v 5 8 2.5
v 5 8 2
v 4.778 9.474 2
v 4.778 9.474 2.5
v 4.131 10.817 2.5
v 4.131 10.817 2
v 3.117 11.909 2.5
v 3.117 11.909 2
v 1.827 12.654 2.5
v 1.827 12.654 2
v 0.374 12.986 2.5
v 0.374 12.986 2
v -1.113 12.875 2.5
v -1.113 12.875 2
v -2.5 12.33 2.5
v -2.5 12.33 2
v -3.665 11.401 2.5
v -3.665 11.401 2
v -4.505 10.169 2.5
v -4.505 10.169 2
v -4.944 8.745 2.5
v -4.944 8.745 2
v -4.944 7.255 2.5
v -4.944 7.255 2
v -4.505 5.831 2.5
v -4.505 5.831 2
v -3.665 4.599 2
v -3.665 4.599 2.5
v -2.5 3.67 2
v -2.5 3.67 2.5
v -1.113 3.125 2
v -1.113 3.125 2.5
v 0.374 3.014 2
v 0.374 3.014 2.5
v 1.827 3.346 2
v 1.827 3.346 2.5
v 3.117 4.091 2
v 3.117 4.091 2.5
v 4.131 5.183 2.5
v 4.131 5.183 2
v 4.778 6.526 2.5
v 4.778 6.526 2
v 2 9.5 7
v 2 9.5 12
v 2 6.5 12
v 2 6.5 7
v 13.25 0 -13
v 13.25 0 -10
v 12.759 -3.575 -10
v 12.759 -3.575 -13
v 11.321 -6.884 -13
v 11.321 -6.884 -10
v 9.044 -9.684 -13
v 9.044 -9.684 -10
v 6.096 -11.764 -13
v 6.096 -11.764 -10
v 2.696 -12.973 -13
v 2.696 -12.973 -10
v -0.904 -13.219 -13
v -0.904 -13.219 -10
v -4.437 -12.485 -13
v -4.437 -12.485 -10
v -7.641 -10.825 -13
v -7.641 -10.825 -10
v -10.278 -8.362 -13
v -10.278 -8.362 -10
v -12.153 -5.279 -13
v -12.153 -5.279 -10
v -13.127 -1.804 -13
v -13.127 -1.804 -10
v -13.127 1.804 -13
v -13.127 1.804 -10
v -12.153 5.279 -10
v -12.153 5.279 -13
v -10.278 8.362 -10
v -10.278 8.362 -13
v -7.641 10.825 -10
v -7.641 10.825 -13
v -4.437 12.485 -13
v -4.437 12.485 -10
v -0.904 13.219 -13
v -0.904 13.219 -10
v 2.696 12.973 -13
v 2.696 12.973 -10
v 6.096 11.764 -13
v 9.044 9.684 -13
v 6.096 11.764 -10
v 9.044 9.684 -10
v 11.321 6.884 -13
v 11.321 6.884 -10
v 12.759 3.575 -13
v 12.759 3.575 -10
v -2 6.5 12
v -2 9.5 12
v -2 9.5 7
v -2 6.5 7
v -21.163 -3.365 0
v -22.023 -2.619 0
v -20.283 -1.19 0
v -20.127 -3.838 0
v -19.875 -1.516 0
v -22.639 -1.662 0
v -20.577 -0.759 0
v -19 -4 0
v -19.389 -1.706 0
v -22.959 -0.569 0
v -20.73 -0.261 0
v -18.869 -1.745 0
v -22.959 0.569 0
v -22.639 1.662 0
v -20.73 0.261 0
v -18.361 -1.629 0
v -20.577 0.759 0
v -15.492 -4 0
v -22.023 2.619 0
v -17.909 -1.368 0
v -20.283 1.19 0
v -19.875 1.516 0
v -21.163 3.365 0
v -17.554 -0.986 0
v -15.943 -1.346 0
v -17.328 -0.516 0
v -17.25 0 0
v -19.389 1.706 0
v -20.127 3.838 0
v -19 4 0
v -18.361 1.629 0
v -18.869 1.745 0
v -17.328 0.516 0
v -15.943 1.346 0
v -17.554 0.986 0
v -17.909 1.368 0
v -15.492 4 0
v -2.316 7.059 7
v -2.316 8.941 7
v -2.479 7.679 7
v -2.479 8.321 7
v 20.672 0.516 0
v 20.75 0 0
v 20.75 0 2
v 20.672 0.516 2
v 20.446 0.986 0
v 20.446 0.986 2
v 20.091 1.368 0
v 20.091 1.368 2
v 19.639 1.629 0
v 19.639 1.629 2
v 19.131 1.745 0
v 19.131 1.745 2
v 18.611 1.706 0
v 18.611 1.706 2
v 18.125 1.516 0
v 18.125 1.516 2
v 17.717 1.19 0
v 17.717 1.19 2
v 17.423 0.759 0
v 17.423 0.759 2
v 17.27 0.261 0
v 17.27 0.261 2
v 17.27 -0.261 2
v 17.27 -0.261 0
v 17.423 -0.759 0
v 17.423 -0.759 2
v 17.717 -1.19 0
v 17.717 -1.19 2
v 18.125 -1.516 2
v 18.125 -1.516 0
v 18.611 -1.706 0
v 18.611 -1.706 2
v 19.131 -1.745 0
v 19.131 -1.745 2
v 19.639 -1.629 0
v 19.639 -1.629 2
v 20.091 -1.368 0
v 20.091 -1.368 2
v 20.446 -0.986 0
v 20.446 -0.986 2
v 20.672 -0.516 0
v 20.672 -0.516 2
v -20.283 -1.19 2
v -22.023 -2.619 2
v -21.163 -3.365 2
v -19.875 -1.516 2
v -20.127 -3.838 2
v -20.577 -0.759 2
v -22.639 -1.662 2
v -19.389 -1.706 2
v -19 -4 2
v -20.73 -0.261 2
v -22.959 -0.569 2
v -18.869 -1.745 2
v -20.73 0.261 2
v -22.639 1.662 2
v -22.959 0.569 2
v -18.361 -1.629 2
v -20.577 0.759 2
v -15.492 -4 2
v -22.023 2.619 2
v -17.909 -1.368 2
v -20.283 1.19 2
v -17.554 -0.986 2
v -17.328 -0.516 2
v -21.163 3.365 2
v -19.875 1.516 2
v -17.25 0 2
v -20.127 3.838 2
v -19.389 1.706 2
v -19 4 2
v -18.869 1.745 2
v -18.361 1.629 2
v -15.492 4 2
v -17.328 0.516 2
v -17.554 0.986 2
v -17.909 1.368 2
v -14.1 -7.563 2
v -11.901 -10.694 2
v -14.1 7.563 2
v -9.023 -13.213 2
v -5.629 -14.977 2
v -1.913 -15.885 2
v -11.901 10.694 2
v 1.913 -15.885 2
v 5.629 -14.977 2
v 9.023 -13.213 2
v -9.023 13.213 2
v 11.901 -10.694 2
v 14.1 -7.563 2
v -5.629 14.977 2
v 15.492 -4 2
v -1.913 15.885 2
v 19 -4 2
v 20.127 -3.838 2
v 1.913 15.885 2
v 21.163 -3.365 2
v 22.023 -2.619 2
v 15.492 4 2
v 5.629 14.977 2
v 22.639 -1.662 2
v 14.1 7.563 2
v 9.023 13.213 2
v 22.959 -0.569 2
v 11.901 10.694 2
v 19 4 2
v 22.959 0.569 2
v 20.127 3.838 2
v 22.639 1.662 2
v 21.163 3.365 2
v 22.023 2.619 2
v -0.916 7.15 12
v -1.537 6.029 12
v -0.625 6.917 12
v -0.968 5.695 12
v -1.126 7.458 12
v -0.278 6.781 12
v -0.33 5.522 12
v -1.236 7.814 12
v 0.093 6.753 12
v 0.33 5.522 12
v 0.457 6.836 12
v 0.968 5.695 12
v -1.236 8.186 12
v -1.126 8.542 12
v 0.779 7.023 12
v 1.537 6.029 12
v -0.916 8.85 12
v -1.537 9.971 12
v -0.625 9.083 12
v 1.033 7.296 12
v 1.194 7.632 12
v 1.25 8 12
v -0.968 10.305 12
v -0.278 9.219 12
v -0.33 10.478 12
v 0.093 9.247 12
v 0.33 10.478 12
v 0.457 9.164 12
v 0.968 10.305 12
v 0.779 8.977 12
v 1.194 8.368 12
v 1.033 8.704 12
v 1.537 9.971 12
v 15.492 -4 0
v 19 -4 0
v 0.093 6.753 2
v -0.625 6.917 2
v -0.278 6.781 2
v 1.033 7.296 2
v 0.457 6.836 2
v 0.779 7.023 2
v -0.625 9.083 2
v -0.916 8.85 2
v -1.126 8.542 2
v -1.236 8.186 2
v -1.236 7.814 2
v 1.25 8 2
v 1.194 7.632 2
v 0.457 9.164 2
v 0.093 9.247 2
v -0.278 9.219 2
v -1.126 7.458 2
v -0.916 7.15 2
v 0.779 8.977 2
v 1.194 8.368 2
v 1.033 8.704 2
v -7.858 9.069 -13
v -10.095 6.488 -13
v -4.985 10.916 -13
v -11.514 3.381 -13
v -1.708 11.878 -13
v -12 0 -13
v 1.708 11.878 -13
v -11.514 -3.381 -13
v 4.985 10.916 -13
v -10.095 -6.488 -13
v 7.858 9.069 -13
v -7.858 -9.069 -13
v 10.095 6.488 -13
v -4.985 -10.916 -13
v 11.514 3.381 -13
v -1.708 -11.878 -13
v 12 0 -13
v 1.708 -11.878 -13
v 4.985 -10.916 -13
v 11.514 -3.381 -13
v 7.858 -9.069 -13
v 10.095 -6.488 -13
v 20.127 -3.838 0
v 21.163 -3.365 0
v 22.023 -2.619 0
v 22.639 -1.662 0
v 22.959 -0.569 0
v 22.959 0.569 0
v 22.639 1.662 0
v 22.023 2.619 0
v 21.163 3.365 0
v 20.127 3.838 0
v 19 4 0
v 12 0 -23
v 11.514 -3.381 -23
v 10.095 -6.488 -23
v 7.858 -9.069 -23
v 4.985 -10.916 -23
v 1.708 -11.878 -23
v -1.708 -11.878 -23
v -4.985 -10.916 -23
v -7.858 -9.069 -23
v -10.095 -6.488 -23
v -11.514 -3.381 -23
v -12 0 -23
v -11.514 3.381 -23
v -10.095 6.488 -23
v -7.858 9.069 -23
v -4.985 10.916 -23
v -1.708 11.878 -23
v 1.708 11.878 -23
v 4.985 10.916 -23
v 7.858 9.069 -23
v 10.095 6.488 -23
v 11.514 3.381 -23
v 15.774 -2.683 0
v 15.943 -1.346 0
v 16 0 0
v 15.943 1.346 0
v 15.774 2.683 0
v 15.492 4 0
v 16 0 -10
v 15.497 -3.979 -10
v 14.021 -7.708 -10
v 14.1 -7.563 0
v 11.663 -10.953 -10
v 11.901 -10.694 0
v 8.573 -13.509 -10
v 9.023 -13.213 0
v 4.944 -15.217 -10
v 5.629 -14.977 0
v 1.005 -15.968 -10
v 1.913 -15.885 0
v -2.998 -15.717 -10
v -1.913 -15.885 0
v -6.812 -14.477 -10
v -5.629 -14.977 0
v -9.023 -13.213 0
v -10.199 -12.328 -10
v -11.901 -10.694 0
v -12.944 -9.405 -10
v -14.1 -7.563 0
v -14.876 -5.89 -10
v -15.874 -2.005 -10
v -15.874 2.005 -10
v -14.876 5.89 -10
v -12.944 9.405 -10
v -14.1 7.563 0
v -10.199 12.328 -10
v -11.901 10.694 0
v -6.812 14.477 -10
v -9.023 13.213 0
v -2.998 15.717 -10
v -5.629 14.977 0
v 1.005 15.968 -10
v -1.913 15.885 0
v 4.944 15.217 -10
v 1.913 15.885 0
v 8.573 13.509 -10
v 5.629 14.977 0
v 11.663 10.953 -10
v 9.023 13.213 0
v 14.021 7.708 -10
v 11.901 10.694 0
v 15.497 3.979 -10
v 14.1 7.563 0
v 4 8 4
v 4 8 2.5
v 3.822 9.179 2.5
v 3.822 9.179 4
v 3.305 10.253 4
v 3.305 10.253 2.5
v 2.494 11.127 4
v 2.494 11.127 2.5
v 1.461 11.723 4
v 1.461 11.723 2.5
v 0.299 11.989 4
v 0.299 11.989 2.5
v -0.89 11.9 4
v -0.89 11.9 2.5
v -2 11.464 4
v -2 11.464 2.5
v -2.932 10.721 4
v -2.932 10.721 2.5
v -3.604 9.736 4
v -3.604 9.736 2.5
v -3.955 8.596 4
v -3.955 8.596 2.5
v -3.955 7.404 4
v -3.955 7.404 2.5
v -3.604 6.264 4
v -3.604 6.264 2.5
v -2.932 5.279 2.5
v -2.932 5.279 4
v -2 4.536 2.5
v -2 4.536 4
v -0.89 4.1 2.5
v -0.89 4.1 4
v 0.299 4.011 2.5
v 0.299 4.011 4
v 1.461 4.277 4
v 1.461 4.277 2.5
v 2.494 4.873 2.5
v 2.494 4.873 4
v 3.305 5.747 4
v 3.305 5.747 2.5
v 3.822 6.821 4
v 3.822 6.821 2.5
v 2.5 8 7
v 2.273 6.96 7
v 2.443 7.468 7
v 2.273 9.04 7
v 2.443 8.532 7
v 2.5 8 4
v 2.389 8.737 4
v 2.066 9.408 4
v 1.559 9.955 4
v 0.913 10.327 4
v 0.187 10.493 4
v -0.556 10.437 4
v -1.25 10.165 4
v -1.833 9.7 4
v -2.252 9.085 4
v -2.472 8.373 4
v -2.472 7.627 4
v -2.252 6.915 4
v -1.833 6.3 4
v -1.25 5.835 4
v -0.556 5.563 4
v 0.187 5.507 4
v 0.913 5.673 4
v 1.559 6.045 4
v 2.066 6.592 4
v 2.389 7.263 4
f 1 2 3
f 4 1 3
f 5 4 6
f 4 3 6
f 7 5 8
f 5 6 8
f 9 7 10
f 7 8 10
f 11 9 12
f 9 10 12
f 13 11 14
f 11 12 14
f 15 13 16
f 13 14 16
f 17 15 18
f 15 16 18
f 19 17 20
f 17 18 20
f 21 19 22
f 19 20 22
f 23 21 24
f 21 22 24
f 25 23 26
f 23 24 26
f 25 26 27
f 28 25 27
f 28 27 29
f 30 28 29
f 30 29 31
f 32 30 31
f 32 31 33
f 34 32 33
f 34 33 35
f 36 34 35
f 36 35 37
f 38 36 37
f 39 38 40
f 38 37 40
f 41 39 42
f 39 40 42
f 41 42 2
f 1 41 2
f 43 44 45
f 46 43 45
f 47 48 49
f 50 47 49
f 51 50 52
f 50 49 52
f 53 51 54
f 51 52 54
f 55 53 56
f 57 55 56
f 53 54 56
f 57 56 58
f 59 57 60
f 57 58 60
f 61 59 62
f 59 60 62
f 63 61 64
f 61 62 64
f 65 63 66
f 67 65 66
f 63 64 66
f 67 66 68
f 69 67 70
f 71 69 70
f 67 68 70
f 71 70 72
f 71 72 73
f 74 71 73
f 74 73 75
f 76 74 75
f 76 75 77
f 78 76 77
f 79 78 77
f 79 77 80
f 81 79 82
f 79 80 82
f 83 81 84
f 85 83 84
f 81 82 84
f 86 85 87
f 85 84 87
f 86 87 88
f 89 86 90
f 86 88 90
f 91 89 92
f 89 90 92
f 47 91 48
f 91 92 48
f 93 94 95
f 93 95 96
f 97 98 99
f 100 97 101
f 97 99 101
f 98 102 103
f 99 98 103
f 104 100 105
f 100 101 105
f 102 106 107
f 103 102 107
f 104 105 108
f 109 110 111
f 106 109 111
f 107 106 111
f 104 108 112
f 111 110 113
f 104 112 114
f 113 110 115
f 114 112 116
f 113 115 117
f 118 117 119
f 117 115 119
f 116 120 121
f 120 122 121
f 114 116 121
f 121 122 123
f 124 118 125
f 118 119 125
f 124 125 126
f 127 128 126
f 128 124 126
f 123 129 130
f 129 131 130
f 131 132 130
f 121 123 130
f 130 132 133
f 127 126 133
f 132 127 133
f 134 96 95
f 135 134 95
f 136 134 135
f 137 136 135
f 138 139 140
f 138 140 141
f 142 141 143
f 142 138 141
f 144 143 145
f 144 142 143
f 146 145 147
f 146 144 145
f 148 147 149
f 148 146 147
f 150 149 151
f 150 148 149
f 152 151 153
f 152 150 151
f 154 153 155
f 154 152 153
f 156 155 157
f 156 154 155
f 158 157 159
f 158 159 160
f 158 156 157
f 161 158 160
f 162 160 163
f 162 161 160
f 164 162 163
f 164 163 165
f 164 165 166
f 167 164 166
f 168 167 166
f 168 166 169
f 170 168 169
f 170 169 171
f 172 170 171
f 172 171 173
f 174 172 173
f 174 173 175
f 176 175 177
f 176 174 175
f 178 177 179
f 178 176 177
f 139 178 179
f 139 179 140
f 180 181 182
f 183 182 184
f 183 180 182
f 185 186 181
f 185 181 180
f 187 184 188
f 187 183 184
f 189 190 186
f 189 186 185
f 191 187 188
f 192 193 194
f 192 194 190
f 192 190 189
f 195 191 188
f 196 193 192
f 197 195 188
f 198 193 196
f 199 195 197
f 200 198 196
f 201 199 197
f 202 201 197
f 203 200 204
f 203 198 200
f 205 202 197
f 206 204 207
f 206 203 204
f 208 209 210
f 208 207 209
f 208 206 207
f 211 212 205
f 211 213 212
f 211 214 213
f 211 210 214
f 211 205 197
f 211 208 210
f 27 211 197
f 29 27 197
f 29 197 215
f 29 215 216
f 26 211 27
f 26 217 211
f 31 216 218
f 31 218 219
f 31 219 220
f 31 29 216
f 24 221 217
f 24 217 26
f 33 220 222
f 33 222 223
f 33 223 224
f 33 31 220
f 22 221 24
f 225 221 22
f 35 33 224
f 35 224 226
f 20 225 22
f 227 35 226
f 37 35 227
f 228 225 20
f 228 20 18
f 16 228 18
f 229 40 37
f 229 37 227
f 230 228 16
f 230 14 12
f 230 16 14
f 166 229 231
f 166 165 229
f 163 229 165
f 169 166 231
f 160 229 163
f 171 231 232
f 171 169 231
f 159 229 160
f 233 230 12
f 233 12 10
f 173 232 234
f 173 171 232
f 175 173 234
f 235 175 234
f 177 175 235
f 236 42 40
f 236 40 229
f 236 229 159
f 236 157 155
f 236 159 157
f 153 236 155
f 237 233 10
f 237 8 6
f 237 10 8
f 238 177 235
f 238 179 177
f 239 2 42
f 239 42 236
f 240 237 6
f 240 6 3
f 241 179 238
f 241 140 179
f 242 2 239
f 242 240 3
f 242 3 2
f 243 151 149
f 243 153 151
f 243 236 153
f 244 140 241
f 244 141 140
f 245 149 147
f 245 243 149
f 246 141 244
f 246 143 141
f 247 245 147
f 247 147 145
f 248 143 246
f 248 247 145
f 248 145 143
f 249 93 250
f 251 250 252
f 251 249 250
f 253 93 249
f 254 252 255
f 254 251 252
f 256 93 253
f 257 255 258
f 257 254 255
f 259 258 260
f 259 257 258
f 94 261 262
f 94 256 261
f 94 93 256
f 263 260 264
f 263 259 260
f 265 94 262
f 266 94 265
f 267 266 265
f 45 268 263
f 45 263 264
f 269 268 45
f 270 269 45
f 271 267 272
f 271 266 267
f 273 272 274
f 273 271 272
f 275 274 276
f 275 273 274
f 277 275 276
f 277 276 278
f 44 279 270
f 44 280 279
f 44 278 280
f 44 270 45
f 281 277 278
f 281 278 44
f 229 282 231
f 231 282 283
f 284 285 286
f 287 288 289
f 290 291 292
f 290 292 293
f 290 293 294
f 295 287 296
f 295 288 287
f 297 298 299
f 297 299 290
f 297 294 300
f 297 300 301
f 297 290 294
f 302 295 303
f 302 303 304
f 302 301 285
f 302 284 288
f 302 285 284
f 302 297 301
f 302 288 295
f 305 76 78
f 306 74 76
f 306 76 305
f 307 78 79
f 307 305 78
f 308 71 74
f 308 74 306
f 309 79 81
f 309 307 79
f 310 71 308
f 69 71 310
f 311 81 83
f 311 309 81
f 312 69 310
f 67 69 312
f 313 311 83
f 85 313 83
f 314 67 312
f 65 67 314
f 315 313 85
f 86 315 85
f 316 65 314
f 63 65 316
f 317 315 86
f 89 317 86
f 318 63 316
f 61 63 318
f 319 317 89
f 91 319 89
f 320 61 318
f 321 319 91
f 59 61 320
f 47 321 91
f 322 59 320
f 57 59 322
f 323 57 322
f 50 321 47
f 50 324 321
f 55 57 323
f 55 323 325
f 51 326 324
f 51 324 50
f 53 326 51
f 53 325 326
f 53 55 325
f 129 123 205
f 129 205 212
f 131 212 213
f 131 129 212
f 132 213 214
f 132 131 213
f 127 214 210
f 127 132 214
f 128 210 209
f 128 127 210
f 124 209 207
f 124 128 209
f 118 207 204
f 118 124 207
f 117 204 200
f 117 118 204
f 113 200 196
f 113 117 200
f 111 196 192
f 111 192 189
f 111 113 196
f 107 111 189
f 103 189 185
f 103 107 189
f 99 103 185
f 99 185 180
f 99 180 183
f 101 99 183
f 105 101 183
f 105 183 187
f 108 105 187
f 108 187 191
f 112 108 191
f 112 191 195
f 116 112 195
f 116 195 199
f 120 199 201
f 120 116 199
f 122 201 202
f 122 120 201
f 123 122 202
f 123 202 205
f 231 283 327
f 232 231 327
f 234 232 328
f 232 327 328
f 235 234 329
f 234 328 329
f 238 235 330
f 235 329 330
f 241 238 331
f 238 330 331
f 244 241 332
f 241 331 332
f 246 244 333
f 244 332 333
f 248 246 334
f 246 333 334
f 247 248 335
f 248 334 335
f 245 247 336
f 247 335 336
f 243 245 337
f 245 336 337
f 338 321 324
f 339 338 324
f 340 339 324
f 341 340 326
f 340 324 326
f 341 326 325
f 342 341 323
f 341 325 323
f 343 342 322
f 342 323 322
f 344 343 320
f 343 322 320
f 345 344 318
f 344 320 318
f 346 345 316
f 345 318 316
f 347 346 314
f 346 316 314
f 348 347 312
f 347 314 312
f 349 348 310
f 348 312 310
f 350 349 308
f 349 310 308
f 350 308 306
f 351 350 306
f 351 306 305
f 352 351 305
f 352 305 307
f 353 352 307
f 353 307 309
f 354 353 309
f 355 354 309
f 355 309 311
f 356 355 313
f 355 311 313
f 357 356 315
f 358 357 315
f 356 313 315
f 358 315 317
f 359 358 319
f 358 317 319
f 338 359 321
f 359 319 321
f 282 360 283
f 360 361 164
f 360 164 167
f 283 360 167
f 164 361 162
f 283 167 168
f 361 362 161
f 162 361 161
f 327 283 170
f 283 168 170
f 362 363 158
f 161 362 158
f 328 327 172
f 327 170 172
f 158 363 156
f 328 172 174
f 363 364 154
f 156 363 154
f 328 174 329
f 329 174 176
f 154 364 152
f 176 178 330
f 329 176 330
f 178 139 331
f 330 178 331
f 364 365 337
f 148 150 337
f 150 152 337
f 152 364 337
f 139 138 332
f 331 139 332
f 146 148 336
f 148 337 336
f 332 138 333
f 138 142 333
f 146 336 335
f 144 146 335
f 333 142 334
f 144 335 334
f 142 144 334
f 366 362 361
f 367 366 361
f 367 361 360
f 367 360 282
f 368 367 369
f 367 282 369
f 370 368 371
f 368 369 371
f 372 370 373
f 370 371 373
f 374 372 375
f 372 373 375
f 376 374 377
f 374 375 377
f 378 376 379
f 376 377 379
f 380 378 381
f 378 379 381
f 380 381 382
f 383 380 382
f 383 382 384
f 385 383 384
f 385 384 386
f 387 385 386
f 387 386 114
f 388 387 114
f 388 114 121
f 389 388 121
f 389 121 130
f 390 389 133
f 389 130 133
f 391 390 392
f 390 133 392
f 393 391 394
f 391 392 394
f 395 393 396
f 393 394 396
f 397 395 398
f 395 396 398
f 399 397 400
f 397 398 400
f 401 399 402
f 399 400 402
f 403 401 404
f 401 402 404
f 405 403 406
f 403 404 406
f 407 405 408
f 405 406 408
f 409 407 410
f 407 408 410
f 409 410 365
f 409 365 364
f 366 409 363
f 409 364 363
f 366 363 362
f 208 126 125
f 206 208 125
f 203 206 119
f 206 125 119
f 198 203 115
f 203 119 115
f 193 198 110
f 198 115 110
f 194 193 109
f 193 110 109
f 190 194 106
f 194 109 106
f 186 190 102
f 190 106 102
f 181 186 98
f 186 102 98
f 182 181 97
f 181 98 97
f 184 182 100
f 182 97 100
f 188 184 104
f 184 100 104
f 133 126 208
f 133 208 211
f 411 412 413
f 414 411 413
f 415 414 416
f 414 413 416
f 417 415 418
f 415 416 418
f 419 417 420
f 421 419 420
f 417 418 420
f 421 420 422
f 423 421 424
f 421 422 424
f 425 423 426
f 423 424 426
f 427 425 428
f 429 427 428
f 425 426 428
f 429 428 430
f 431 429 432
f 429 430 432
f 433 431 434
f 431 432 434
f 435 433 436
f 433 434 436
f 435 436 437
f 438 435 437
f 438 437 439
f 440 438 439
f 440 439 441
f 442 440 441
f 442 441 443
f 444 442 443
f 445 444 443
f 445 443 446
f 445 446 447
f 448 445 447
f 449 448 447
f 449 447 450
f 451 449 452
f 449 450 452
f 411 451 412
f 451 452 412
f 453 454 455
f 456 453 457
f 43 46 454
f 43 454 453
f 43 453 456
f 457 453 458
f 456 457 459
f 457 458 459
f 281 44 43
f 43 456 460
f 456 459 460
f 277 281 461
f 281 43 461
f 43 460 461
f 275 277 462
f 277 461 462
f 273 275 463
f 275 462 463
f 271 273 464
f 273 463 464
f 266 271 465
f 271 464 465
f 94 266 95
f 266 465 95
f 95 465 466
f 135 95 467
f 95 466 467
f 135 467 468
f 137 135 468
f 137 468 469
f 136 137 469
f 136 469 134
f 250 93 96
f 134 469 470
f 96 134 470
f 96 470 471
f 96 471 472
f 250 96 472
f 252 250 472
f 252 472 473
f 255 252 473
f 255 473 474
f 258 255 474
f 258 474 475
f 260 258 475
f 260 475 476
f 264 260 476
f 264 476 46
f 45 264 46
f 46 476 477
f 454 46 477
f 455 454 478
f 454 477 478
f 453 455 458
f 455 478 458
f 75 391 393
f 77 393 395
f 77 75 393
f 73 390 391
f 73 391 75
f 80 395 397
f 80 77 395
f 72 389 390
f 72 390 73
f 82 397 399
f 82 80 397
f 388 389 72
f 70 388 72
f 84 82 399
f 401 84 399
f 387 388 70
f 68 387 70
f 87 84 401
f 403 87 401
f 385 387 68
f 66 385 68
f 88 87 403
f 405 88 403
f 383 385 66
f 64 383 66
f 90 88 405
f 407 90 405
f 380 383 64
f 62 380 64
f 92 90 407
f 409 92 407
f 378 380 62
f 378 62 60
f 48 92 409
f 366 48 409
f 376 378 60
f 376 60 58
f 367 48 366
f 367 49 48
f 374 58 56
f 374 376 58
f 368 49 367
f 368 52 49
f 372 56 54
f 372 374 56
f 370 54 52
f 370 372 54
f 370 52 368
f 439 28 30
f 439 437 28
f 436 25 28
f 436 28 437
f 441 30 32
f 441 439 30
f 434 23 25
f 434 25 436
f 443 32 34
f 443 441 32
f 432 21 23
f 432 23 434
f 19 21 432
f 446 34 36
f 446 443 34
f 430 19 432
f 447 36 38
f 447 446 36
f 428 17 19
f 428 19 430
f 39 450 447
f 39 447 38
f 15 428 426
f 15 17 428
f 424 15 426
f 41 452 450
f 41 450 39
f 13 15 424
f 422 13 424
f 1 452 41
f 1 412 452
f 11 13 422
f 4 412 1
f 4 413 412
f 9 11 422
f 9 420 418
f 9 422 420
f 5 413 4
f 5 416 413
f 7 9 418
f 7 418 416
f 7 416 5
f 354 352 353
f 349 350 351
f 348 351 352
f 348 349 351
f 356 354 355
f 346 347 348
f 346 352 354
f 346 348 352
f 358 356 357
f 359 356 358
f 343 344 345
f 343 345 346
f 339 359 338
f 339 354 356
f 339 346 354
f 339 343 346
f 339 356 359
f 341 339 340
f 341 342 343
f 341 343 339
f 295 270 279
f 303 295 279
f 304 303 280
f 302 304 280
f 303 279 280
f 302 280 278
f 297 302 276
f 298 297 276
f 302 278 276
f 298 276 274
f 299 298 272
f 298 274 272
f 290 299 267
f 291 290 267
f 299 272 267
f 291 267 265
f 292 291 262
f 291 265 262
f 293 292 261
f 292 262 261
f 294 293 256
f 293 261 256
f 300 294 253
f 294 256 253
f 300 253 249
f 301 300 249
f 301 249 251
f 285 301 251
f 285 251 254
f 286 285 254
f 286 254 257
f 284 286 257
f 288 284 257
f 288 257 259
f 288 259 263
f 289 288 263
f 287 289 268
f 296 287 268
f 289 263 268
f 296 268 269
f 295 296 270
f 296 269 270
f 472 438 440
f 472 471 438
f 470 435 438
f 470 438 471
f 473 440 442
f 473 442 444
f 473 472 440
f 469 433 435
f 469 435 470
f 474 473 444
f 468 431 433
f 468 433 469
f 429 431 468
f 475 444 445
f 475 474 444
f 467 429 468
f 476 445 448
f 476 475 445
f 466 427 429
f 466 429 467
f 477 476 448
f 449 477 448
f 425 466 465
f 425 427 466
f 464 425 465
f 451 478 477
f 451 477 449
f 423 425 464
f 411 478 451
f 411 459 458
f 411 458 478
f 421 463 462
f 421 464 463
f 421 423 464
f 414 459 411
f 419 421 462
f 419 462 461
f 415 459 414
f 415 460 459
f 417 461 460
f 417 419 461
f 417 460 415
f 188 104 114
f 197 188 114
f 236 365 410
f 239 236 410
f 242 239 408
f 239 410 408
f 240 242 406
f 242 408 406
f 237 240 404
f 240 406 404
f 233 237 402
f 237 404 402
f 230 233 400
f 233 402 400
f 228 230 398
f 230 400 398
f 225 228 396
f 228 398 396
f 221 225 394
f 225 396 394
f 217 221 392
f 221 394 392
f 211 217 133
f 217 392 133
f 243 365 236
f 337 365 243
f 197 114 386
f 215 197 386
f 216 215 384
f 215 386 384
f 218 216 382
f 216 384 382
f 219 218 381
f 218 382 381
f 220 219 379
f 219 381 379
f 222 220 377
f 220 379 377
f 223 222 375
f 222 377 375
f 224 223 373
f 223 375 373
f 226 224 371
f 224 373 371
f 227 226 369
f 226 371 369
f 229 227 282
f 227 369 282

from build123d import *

# Parameters (mm, degrees)
SKETCH023_R     = 1.75
PAD013_DEPTH    = 2
SKETCH024_R     = 16
PAD014_DEPTH    = 10
SKETCH025_R     = 13.25
PAD015_DEPTH    = 3
SKETCH026_R     = 12
PAD016_DEPTH    = 10
SKETCH027_R     = 5
PAD017_DEPTH    = 0.5
SKETCH028_R     = 4
PAD018_DEPTH    = 1.5
SKETCH029_R     = 2.5
PAD019_DEPTH    = 8
SKETCH030_R     = 1.25
POCKET008_DEPTH = 10
POCKET009_DEPTH = 5


with BuildPart() as part:
    # Sketch023 → Pad013 (new body)
    with BuildSketch(Plane.XY):
        with BuildLine():
            ThreePointArc((15.491933, 4), (0, 16), (-15.491933, 4))
            Line((-19, 4), (-15.491933, 4))
            ThreePointArc((-19, 4), (-23, 0), (-19, -4))
            Line((-19, -4), (-15.491933, -4))
            ThreePointArc((-15.491933, -4), (0, -16), (15.491933, -4))
            Line((15.491933, -4), (19, -4))
            ThreePointArc((19, -4), (23, 0), (19, 4))
            Line((15.491933, 4), (19, 4))
        make_face()
        with Locations((-19, 0)):
            Circle(SKETCH023_R, mode=Mode.SUBTRACT)
        with Locations((19, 0)):
            Circle(SKETCH023_R, mode=Mode.SUBTRACT)
    extrude(amount=PAD013_DEPTH)

    # Sketch024 (on Face11 of Pad013) → Pad014 (join)
    with BuildSketch(Plane(origin=(0, 0, 0), x_dir=(1, 0, 0), z_dir=(0, 0, -1))):
        Circle(SKETCH024_R)
    extrude(amount=PAD014_DEPTH)

    # Sketch025 (on Face13 of Pad014) → Pad015 (join)
    with BuildSketch(Plane(origin=(0, 0, -10), x_dir=(1, 0, 0), z_dir=(0, 0, -1))):
        Circle(SKETCH025_R)
    extrude(amount=PAD015_DEPTH)

    # Sketch026 (on Face15 of Pad015) → Pad016 (join)
    with BuildSketch(Plane(origin=(0, 0, -13), x_dir=(1, 0, 0), z_dir=(0, 0, -1))):
        Circle(SKETCH026_R)
    extrude(amount=PAD016_DEPTH)

    # Sketch027 (on Face5 of Pad016) → Pad017 (join)
    with BuildSketch(Plane.XY.offset(2)):
        with Locations((0, 8)):
            Circle(SKETCH027_R)
    extrude(amount=PAD017_DEPTH)

    # Sketch028 (on Face16 of Pad017) → Pad018 (join)
    with BuildSketch(Plane.XY.offset(2.5)):
        with Locations((0, 8)):
            Circle(SKETCH028_R)
    extrude(amount=PAD018_DEPTH)

    # Sketch029 (on Face20 of Pad018) → Pad019 (join)
    with BuildSketch(Plane.XY.offset(4)):
        with Locations((0, 8)):
            Circle(SKETCH029_R)
    extrude(amount=PAD019_DEPTH)

    # Sketch030 (on Face23 of Pad019) → Pocket008 (cut)
    with BuildSketch(Plane.XY.offset(12)):
        with Locations((0, 8)):
            Circle(SKETCH030_R)
    extrude(amount=-POCKET008_DEPTH, mode=Mode.SUBTRACT)

    # Sketch031 (on Face23 of Pocket008) → Pocket009 (cut)
    with BuildSketch(Plane.XY.offset(12)):
        with BuildLine():
            Line((2, 9.5), (2, 6.5))
            ThreePointArc((2, 6.5), (2.5, 8), (2, 9.5))
        make_face()
        with BuildLine():
            Line((-2, 9.5), (-2, 6.5))
            ThreePointArc((-2, 9.5), (-2.5, 8), (-2, 6.5))
        make_face()
    extrude(amount=-POCKET009_DEPTH, mode=Mode.SUBTRACT)


solid = part.part
